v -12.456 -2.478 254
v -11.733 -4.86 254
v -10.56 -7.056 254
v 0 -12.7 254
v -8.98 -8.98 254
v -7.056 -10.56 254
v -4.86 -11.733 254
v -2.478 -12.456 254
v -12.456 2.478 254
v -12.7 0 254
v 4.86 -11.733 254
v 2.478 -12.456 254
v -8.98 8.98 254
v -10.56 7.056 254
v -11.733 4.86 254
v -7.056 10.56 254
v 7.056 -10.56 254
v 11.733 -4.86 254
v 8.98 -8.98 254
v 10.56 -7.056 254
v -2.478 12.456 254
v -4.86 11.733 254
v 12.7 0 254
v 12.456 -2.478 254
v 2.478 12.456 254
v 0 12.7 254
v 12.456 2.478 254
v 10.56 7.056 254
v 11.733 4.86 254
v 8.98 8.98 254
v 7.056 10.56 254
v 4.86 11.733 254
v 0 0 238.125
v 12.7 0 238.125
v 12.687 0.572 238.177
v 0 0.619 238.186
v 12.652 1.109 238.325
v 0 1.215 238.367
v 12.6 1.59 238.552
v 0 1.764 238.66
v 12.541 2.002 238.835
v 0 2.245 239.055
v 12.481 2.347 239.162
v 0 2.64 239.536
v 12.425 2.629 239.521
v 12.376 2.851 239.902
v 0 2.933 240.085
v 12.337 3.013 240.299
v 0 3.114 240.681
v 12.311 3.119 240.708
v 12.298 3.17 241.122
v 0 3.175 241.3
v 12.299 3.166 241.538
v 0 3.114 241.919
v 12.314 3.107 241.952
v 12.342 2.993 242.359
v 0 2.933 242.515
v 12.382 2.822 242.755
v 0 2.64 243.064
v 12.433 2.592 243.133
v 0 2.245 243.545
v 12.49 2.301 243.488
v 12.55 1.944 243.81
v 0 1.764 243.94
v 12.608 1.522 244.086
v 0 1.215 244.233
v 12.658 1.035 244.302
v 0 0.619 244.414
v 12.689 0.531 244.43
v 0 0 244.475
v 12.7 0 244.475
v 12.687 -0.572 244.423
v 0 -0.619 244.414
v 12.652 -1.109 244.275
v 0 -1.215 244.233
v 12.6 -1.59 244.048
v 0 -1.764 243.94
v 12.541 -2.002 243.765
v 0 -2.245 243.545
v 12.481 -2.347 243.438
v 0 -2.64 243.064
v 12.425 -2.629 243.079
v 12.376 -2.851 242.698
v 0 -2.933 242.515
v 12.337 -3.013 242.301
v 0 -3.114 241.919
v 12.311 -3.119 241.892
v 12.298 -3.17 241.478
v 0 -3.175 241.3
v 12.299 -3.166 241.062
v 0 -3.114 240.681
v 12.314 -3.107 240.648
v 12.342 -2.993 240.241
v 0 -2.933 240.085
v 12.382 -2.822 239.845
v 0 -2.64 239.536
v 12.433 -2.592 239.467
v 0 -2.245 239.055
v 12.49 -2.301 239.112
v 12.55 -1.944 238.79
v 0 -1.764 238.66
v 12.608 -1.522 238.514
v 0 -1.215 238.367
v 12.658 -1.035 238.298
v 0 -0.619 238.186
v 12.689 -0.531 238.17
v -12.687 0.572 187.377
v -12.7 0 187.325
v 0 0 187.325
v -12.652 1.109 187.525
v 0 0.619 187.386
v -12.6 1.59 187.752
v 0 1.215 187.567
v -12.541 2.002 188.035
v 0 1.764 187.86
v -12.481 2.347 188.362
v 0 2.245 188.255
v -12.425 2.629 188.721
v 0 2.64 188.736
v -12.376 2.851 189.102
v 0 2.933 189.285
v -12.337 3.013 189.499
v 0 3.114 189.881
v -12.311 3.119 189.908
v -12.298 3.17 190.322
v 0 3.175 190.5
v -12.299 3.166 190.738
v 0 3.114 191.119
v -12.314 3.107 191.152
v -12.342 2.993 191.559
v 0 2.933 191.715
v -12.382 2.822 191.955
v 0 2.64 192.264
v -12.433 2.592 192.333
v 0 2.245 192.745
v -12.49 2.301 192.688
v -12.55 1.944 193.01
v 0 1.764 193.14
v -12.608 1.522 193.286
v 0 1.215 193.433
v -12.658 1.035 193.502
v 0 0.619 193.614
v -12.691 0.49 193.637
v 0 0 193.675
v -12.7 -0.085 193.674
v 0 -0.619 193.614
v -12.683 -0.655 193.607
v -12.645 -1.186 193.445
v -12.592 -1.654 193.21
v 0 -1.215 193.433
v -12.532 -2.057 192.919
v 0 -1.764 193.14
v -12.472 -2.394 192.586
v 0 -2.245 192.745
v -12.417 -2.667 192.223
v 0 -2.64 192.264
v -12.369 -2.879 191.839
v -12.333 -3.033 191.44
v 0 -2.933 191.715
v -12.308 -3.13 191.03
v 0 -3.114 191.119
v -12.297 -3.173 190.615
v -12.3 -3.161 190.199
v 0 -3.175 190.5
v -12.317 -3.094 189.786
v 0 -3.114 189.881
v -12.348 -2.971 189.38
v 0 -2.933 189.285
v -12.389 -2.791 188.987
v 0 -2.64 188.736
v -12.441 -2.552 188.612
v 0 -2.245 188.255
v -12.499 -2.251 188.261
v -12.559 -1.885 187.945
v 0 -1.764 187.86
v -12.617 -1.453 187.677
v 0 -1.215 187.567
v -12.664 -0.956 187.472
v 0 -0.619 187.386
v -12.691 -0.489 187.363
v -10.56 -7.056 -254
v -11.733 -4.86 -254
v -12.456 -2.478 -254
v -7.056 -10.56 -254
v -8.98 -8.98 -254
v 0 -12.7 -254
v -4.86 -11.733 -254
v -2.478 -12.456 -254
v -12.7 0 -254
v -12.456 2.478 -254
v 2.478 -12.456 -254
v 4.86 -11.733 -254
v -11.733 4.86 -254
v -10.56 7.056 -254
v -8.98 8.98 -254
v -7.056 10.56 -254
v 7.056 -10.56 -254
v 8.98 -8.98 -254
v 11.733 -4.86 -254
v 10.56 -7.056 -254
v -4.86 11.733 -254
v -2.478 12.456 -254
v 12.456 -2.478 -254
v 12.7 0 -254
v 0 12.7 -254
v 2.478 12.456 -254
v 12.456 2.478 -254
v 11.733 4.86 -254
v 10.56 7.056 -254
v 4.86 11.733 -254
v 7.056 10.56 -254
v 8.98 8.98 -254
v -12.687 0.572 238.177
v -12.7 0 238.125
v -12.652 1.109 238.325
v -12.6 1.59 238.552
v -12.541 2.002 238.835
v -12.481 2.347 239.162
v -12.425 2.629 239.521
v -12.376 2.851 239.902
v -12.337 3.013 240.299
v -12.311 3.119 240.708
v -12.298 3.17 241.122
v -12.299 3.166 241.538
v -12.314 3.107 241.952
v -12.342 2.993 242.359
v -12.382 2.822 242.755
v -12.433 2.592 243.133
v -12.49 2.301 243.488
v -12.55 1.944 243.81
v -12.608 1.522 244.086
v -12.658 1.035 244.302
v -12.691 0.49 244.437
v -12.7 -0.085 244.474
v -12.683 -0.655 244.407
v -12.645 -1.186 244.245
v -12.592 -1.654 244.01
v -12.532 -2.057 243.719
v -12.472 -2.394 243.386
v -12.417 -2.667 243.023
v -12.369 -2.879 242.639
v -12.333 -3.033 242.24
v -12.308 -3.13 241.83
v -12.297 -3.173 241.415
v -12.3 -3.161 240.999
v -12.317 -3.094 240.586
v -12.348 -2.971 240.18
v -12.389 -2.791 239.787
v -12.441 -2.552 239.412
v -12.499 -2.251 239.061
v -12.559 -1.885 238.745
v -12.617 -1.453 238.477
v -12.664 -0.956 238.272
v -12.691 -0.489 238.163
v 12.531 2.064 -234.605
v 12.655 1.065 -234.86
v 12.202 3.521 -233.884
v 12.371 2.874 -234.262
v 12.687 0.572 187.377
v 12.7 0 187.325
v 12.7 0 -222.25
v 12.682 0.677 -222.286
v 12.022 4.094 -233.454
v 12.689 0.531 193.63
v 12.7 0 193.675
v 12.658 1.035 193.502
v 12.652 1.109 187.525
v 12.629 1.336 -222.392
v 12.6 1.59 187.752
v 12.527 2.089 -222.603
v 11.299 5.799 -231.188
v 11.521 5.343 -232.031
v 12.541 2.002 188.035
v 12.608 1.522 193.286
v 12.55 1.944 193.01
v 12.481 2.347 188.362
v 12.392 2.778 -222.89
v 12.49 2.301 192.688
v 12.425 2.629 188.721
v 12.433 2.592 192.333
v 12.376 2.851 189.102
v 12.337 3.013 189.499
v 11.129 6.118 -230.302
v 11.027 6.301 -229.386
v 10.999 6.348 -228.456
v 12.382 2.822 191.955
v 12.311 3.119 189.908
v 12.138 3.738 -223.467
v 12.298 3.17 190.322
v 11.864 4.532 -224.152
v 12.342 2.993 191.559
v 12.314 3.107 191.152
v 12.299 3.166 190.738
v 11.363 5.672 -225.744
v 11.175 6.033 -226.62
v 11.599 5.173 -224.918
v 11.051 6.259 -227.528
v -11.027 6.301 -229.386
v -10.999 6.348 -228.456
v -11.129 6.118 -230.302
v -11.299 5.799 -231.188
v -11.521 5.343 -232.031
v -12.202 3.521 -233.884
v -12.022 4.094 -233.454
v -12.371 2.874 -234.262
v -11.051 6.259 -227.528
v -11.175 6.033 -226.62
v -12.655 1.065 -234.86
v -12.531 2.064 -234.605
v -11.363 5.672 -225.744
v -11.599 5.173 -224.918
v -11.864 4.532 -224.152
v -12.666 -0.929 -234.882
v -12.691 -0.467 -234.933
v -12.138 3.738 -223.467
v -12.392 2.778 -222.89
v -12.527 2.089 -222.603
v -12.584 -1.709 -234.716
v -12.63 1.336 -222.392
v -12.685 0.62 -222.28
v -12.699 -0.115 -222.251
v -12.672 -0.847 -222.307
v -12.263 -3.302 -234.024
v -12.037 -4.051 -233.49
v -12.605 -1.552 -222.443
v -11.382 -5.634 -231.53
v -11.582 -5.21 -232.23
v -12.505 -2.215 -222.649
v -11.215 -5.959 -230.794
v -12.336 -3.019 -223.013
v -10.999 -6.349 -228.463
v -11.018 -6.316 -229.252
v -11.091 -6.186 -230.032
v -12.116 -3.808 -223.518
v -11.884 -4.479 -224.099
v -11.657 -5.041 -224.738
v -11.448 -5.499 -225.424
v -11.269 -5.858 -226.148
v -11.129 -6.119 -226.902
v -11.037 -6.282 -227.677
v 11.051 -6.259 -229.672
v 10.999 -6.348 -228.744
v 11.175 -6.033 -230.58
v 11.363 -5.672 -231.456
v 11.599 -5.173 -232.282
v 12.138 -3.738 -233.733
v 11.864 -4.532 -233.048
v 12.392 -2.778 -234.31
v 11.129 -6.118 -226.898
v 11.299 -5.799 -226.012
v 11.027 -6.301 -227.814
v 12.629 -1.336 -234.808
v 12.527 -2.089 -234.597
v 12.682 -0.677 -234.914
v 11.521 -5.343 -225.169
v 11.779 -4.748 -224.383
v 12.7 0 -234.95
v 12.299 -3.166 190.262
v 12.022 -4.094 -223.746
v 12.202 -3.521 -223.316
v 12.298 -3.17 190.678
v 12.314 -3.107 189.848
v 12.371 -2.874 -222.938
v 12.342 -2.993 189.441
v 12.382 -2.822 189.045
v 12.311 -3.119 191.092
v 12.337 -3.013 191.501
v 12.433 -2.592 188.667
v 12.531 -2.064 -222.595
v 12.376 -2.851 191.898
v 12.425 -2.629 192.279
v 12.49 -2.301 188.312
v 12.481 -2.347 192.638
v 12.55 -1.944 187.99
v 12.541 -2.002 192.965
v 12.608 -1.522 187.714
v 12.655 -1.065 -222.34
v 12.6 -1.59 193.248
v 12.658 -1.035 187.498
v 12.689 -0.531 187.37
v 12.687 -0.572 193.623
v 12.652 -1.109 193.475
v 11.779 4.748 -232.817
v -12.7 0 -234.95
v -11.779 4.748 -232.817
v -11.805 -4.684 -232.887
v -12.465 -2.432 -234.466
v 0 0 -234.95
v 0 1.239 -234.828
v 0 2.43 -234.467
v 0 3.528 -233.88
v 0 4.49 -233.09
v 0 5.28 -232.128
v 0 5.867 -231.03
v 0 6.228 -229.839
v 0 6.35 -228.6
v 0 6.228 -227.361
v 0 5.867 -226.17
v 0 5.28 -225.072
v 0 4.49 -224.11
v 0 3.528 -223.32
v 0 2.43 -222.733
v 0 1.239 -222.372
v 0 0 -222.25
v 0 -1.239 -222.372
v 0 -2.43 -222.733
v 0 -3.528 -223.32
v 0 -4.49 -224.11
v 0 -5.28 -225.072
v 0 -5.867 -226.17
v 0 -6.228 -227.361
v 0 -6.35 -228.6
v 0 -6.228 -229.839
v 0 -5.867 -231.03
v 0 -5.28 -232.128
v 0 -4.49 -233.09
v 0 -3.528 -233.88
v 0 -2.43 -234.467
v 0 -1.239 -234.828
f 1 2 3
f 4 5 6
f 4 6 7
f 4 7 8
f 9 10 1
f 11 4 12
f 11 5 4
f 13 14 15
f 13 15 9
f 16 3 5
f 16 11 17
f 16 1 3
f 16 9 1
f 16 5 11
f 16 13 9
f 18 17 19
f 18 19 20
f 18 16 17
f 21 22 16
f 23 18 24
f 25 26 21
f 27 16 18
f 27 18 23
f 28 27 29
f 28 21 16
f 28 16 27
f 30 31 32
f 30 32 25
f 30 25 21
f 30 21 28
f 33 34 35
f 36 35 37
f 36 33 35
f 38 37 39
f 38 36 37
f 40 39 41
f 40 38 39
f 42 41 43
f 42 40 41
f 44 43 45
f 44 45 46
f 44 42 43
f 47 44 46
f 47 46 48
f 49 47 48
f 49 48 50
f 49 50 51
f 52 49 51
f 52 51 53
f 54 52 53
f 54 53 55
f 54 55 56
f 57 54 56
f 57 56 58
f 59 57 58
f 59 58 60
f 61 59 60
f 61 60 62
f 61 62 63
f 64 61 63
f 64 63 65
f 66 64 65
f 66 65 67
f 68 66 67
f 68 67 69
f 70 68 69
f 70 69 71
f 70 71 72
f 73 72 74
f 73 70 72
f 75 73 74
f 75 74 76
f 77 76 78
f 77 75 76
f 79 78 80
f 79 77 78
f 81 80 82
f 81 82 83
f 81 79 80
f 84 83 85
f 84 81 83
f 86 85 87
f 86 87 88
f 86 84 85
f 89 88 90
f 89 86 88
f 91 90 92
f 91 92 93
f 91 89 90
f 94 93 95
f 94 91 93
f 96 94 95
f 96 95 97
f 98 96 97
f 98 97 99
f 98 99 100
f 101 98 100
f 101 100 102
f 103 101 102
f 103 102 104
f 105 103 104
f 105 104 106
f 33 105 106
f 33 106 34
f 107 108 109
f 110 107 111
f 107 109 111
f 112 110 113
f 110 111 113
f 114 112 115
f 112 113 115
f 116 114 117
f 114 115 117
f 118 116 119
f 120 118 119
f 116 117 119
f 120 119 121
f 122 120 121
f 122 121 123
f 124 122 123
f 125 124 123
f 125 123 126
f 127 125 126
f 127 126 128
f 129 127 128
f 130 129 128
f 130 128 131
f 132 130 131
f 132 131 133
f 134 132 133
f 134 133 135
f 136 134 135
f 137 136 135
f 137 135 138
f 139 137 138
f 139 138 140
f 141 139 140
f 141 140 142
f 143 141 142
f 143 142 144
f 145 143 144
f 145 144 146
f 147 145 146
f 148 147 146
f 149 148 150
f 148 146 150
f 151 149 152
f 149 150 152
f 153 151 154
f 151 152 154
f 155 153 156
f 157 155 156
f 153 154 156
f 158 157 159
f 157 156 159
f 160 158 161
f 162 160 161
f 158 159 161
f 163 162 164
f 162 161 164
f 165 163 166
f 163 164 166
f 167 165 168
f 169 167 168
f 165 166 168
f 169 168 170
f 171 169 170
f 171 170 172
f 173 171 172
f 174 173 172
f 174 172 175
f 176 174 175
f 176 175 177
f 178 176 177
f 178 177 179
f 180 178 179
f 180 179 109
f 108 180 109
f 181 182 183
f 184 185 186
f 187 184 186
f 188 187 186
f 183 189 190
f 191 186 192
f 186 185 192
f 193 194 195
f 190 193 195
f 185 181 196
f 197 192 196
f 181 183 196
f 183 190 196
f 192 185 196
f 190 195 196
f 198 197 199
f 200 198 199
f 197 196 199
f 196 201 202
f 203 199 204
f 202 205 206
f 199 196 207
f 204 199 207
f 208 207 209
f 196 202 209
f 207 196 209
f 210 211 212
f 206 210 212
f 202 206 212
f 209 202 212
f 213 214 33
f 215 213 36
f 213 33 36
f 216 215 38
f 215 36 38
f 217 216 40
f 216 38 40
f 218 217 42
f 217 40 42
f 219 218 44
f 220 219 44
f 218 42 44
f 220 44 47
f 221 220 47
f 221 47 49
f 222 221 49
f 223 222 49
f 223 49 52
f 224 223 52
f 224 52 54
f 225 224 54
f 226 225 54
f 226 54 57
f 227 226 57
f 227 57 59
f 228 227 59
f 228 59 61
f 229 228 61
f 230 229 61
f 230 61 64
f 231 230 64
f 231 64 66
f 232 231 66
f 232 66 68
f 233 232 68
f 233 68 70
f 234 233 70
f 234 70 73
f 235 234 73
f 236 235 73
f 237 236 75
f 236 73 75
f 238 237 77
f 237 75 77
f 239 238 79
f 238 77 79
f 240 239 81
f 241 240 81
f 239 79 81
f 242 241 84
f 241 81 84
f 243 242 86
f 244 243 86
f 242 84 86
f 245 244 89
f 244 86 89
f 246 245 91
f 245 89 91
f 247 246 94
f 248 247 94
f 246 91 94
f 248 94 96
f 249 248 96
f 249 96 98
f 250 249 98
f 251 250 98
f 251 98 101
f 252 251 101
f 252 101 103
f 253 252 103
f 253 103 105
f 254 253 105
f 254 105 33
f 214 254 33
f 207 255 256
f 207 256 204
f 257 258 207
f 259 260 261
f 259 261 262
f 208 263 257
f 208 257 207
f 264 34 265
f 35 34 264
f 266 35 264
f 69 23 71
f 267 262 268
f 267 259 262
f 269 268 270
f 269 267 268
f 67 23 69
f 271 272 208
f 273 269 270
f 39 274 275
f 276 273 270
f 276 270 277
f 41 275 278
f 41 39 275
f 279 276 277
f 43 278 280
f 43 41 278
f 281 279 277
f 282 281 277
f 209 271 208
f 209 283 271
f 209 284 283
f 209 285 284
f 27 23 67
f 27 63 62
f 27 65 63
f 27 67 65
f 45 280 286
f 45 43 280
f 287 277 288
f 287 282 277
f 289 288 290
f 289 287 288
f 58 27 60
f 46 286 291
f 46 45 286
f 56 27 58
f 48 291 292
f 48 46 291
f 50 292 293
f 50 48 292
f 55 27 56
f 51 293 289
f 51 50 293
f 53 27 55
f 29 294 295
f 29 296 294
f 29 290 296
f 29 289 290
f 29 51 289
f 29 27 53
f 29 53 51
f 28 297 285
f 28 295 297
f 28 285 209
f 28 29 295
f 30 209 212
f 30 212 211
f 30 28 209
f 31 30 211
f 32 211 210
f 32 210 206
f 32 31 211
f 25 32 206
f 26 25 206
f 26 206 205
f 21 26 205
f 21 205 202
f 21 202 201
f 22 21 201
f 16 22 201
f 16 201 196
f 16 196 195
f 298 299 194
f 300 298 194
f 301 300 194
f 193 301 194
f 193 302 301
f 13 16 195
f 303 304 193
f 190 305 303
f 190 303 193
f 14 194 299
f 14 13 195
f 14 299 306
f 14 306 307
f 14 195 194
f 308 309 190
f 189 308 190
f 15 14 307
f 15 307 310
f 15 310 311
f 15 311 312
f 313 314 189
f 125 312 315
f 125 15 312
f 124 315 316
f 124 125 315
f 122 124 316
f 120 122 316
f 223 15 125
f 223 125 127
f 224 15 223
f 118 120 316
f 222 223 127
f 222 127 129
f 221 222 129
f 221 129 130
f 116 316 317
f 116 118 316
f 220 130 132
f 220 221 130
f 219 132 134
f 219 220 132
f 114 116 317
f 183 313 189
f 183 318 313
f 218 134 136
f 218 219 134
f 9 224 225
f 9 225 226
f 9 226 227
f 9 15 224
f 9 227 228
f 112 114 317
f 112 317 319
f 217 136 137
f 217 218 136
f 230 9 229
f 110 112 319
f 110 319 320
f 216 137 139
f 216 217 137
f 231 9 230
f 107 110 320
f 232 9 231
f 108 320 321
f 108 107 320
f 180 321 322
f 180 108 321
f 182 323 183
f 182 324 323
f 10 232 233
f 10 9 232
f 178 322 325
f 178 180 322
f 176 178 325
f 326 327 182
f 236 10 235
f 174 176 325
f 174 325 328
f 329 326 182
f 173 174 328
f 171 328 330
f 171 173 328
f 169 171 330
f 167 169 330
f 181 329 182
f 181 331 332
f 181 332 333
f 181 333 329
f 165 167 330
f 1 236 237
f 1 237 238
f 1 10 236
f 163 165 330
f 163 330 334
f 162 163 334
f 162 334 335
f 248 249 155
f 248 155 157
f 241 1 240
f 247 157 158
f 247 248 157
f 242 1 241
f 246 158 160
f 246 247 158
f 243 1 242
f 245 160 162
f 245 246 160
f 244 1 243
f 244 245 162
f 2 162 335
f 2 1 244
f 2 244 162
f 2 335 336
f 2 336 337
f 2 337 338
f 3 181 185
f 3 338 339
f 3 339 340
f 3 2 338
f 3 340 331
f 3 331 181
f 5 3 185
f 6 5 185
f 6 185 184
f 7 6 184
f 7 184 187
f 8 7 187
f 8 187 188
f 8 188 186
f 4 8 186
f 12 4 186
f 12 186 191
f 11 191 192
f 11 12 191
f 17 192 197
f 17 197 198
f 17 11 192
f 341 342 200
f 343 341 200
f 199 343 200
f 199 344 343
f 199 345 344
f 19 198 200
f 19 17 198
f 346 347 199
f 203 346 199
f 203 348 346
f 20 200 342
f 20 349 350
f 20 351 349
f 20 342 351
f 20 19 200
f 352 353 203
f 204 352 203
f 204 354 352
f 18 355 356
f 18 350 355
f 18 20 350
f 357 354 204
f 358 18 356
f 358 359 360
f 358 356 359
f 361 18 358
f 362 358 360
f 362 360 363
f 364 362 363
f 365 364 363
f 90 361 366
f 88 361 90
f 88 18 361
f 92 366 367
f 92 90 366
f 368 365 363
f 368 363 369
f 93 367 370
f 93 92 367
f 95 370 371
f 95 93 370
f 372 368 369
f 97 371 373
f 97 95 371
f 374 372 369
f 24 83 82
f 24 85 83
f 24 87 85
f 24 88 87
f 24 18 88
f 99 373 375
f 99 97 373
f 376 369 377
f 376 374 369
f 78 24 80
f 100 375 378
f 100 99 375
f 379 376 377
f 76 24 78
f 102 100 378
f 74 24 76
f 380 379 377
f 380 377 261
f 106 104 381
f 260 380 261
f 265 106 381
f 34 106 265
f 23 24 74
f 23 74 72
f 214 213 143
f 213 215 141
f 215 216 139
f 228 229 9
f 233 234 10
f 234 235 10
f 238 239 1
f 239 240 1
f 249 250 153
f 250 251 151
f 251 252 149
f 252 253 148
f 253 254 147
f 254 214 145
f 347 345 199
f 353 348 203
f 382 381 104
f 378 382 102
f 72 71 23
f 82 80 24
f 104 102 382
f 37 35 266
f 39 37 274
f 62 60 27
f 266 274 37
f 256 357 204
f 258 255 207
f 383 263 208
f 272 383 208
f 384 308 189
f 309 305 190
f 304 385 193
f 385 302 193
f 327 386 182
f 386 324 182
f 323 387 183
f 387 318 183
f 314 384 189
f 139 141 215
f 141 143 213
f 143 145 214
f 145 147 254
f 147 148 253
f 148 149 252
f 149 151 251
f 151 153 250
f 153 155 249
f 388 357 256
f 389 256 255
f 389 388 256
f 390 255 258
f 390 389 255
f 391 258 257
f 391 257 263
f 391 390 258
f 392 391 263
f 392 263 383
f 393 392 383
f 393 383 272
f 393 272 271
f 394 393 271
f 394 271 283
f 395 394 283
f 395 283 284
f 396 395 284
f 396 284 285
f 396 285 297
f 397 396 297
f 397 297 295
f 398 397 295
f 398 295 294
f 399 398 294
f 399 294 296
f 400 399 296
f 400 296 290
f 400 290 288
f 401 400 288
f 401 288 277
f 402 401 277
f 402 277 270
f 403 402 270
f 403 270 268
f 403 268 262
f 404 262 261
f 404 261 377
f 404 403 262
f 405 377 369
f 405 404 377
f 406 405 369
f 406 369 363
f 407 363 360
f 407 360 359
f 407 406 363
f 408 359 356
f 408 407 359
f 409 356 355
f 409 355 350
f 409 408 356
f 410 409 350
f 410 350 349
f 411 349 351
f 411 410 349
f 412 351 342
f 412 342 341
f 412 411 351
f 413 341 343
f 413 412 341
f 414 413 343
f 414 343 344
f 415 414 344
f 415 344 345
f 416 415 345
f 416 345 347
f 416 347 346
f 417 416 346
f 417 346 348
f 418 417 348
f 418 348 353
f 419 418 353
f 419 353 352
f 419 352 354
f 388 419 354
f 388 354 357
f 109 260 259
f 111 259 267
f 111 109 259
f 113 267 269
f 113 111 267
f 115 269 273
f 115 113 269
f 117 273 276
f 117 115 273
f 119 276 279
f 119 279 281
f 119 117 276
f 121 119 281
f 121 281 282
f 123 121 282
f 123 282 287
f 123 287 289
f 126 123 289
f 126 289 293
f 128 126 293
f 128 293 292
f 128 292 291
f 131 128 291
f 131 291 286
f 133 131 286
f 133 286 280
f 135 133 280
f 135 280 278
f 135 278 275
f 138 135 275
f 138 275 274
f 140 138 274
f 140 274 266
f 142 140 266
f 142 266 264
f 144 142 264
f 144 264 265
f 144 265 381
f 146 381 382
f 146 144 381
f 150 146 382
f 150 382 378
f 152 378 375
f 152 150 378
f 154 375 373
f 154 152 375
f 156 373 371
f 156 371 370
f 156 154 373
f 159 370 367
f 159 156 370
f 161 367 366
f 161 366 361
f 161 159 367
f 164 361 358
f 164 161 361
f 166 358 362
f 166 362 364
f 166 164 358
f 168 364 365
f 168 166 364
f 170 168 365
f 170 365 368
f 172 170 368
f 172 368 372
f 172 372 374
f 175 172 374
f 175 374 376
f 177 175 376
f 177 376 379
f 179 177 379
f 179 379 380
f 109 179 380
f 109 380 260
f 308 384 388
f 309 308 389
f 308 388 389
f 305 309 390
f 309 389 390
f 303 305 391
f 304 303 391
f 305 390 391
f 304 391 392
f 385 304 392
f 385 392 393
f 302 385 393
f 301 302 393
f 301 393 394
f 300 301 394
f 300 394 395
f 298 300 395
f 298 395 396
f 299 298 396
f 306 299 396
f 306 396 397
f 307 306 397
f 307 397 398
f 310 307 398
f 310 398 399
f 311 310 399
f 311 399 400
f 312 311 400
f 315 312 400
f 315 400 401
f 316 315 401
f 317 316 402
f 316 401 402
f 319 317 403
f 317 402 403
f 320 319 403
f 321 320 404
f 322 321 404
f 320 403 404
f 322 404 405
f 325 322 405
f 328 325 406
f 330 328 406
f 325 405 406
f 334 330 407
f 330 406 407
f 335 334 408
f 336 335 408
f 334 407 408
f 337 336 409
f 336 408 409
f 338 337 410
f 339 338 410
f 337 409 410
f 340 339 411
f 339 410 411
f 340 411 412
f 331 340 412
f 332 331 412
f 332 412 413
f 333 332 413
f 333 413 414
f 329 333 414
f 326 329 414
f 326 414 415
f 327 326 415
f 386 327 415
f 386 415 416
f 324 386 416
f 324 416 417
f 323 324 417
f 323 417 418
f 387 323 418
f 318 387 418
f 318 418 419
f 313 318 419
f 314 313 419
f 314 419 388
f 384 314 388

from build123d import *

# Parameters (mm, degrees)
SKETCH1_R               = 12.7
BOSS_EXTRUDE1_DEPTH     = 254
SKETCH2_R               = 3.175
SKETCH2_R_2             = 6.35
CUT_EXTRUDE1_DEPTH      = 13.7
CUT_EXTRUDE1_DEPTH_BACK = 13.7


with BuildPart() as part:
    # Sketch1 → Boss-Extrude1 (new body, symmetric)
    with BuildSketch(Plane.XY):
        Circle(SKETCH1_R)
    extrude(amount=BOSS_EXTRUDE1_DEPTH, both=True)

    # Sketch2 → Cut-Extrude1 (cut, two sides)
    with BuildSketch(Plane(origin=(0, 0, 0), x_dir=(0, 0, -1), z_dir=(1, 0, 0))) as cut_extrude1_sk:
        with Locations((-241.3, 0)):
            Circle(SKETCH2_R)
        with Locations((-190.5, 0)):
            Circle(SKETCH2_R)
        with Locations((228.6, 0)):
            Circle(SKETCH2_R_2)
    extrude(amount=CUT_EXTRUDE1_DEPTH, mode=Mode.SUBTRACT)
    extrude(cut_extrude1_sk.sketch, amount=-CUT_EXTRUDE1_DEPTH_BACK, mode=Mode.SUBTRACT)


solid = part.part
